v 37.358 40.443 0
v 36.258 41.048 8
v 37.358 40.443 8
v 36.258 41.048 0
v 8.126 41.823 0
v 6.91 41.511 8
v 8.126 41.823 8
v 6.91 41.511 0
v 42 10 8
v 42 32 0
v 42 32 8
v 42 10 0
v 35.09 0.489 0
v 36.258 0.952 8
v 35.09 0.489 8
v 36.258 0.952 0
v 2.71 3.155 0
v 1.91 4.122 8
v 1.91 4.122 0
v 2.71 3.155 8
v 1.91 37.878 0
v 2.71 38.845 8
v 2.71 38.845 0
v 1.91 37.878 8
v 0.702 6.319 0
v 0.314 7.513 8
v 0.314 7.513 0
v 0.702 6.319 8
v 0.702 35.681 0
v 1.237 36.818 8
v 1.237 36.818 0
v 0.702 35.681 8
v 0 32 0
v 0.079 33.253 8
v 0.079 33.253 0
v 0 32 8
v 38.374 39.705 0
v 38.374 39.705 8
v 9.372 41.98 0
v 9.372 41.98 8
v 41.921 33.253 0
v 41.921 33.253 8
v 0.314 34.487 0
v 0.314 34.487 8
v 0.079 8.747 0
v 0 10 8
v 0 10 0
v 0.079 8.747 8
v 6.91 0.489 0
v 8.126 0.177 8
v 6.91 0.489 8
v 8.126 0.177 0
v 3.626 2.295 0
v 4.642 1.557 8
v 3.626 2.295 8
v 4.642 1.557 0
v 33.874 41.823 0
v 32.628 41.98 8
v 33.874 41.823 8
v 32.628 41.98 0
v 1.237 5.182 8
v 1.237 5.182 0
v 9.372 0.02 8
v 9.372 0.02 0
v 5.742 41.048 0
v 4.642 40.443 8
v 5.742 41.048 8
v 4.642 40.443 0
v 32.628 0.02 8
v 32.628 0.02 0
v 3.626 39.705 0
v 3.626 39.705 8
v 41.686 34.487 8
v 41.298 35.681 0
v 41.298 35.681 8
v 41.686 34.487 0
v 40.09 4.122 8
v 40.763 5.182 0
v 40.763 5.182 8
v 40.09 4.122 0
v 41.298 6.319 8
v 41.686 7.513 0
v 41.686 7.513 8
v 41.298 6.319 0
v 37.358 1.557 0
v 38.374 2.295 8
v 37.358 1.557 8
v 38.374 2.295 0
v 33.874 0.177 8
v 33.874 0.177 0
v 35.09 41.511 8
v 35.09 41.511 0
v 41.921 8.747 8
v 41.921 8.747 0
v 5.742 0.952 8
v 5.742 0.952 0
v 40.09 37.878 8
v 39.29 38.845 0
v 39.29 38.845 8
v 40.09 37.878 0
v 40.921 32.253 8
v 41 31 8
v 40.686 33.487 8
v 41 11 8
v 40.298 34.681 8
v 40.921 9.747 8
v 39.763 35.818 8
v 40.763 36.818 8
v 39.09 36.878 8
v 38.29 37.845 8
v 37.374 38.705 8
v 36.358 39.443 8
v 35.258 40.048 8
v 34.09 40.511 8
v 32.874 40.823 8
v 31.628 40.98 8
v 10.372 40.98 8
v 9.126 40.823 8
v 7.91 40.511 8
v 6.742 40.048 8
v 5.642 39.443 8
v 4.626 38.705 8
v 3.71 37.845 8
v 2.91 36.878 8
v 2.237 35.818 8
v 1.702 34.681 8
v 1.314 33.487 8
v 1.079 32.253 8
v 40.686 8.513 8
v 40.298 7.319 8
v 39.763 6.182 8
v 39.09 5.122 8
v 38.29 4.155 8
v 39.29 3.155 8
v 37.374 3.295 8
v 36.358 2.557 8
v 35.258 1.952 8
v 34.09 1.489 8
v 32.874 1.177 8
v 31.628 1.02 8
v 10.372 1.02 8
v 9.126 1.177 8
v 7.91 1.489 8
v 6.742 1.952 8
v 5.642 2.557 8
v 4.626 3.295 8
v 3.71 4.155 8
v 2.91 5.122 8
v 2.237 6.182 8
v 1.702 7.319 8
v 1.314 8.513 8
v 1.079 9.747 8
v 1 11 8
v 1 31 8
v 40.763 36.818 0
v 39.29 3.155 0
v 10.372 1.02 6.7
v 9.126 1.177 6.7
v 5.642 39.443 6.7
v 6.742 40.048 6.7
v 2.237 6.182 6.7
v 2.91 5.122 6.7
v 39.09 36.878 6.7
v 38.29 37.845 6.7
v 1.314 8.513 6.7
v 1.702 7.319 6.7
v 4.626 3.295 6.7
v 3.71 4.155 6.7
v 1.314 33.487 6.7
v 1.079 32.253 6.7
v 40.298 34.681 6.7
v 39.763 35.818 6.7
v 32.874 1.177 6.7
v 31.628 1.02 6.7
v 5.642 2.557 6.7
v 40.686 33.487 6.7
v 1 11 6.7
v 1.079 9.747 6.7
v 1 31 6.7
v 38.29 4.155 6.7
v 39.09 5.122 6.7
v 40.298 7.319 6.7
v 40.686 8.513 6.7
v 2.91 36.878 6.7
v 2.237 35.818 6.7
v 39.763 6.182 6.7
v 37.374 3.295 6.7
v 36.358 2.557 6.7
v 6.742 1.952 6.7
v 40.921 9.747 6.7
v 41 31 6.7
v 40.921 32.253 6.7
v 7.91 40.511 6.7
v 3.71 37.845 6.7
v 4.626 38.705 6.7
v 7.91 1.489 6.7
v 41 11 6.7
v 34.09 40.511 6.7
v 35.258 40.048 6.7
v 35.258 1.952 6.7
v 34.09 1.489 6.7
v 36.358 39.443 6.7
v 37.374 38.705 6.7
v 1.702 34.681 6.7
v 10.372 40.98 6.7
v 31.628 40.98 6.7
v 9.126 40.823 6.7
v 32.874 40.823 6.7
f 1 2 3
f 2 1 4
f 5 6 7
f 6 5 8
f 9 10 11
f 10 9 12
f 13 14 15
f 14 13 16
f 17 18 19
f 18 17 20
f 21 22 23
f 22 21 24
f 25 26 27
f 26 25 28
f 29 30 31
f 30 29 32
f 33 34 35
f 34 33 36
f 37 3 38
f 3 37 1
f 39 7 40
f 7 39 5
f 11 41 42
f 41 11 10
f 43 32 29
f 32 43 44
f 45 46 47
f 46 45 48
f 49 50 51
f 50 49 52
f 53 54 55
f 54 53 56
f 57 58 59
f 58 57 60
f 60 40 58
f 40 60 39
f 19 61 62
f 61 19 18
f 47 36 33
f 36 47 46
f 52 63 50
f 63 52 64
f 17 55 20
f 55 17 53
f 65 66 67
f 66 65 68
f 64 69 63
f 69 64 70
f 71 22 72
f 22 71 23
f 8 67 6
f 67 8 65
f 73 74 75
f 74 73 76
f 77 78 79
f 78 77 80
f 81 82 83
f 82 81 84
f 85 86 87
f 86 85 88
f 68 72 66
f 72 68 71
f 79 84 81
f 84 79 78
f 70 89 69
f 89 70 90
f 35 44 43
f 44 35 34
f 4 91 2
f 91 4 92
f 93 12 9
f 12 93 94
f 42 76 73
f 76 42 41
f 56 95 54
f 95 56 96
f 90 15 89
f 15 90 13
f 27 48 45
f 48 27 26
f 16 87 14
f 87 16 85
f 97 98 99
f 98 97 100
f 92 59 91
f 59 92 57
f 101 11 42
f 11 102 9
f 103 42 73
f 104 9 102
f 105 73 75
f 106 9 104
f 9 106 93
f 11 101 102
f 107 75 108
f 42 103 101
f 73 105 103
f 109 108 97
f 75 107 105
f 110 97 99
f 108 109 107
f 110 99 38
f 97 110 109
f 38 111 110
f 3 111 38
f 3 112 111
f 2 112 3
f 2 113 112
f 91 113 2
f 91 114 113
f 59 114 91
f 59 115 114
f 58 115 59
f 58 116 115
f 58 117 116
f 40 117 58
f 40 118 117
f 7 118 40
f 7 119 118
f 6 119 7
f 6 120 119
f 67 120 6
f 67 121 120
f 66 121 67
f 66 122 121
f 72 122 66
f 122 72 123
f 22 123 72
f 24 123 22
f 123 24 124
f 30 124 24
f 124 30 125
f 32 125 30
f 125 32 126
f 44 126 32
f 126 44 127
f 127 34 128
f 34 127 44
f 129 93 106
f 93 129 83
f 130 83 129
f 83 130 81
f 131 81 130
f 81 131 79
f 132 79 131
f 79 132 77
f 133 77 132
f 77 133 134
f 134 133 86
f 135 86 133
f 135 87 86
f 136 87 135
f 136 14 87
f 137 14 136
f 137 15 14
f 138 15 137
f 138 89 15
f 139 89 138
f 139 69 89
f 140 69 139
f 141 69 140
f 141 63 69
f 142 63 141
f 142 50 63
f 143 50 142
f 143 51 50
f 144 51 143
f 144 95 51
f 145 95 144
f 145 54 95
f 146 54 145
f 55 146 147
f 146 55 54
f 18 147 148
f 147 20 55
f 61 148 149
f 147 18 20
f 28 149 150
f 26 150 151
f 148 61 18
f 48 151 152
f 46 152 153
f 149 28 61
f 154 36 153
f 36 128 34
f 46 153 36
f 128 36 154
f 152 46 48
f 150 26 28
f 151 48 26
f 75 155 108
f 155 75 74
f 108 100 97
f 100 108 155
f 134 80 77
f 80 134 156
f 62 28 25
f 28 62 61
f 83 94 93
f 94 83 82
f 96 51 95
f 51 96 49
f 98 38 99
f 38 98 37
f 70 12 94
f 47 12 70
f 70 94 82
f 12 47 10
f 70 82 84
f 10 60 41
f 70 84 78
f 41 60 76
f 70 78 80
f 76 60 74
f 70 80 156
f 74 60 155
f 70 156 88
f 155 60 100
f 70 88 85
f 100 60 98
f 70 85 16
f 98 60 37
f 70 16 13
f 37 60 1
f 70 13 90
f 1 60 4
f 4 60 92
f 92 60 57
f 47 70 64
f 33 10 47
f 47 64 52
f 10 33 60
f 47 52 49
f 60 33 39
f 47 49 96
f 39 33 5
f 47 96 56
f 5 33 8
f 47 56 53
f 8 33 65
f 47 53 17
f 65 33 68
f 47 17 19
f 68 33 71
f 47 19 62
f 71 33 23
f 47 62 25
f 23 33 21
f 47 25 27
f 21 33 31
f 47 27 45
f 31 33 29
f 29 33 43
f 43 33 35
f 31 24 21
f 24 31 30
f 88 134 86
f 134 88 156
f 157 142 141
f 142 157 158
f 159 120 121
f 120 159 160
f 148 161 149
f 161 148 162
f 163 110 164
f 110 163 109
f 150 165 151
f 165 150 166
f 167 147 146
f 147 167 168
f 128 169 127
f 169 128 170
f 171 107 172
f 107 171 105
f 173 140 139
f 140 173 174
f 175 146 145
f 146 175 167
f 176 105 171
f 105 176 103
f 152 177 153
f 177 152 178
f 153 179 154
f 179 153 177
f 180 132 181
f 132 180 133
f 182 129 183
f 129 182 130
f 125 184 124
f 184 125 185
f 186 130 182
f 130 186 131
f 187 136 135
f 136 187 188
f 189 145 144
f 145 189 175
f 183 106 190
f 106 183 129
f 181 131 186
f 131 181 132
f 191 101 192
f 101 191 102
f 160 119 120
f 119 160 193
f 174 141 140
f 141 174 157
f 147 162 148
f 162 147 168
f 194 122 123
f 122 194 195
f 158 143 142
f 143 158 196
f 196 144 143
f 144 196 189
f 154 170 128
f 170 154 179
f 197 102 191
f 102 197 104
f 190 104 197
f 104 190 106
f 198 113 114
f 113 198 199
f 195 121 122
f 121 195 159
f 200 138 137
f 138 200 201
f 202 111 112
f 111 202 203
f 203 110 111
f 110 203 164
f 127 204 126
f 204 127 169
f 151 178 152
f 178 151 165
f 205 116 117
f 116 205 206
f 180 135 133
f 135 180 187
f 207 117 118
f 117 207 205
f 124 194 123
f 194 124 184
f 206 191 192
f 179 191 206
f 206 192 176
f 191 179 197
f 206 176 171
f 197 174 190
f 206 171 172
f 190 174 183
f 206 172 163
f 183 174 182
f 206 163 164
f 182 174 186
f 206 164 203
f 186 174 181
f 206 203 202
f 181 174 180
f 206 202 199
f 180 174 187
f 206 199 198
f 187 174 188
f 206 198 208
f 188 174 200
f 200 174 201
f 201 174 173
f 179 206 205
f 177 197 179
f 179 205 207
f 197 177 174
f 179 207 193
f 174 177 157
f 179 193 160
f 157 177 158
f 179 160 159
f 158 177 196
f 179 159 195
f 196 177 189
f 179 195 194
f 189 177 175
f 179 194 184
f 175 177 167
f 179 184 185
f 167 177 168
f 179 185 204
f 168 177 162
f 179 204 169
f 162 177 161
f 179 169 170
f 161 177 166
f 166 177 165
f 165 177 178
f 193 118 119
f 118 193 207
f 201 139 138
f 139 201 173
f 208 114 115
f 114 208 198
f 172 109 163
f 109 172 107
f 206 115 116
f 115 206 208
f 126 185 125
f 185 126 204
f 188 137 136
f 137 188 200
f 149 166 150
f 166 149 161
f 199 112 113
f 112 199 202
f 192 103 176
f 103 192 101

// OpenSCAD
// file: parts/main_body.scad
include <../config.scad>
include <../include/modules.scad>
include <../include/sizes.scad>

module mainBody() {
	difference() {
		roundedCube(main_body_dimens, main_body_corner_rad);

		translate([0, 0, main_body_dimens.z-membrane_inset_dimens.z])
		#translate([
				main_body_dimens.x-membrane_inset_dimens.x,
				main_body_dimens.y-membrane_inset_dimens.y
			]/2)
		roundedCube(membrane_inset_dimens, membrane_inset_corner_rad);
	}
}
// file: include/modules.scad
module roundedCube(dimens, corner_radius, $fn=50) {
	hull() {
		translate([corner_radius, corner_radius])
		cylinder(r=corner_radius, h=dimens.z);

		translate([corner_radius, dimens.y-corner_radius])
		cylinder(r=corner_radius, h=dimens.z);


		translate([dimens.x-corner_radius, corner_radius])
		cylinder(r=corner_radius, h=dimens.z);


		translate([dimens.x-corner_radius, dimens.y-corner_radius])
		cylinder(r=corner_radius, h=dimens.z);
	}
}
// file: include/sizes.scad
/*
- Outer size:
    - Size: X 42, Y 42, Z 8
    - Corner radius: 10
- Membrane inset
    - Centered
    - Size: Radial 1, Z 1.3
    - Corner radius: 6.5
- Membrane slots
    - Top, bottom, right: 5x2, centered
    - Left: 2 slots, 6x1.5, 4 from center
- PCB housing
    - Centered
    - Size: X 33.4, Y 33.4, Z 5 (with 1mm PCB standoffs from bottom of housing to Z 2.5)
- Battery housing
    - Position: X 9.9, Y 13.4, Z 0
        - Z relative to PCB housing top
        - X, Y relative to outer size
    - Size: ø 19.7, Z 3.7
- Button hole
    - Position: X centered, Y 8.9 to center 
    - Size: ø 4
- JTAG hole
    - Position: X 32, Y 9.5
    - Size: X 3, Y 11
- UART hole
    - Position: X 29, Y 10
    - Size: X 4.7, Y 4.7
- Pivot holes
    - Position: top+bottom sides, 1.9 from top to top of hole
    - Size: 2.9
- Orientation slot
    - Position: top side, 5.6 left from center
    - Size: Y 1, Z 3
*/

main_body_h=8;
main_body_dimens=[42, 42, main_body_h];
main_body_corner_rad=10;

membrane_inset_dimens=[40, 40, 1.3];
membrane_inset_corner_rad=10;
// file: config.scad
screw_diam=2;

// For custom bottom lid
screw_pos=[9, 33];

// Set to false if you want to use it with the IKEA bottom lid
carve_swd_hole=true;

screw_hole_fn=6;

build_supports=false;
supports_thickn=0.2;
supports_contanct_z_dist=0.2; // detachable (hopefully)
// main file
include <config.scad>
include <include/sizes.scad>
include <include/modules.scad>
include <parts/main_body.scad>

mainBody();
